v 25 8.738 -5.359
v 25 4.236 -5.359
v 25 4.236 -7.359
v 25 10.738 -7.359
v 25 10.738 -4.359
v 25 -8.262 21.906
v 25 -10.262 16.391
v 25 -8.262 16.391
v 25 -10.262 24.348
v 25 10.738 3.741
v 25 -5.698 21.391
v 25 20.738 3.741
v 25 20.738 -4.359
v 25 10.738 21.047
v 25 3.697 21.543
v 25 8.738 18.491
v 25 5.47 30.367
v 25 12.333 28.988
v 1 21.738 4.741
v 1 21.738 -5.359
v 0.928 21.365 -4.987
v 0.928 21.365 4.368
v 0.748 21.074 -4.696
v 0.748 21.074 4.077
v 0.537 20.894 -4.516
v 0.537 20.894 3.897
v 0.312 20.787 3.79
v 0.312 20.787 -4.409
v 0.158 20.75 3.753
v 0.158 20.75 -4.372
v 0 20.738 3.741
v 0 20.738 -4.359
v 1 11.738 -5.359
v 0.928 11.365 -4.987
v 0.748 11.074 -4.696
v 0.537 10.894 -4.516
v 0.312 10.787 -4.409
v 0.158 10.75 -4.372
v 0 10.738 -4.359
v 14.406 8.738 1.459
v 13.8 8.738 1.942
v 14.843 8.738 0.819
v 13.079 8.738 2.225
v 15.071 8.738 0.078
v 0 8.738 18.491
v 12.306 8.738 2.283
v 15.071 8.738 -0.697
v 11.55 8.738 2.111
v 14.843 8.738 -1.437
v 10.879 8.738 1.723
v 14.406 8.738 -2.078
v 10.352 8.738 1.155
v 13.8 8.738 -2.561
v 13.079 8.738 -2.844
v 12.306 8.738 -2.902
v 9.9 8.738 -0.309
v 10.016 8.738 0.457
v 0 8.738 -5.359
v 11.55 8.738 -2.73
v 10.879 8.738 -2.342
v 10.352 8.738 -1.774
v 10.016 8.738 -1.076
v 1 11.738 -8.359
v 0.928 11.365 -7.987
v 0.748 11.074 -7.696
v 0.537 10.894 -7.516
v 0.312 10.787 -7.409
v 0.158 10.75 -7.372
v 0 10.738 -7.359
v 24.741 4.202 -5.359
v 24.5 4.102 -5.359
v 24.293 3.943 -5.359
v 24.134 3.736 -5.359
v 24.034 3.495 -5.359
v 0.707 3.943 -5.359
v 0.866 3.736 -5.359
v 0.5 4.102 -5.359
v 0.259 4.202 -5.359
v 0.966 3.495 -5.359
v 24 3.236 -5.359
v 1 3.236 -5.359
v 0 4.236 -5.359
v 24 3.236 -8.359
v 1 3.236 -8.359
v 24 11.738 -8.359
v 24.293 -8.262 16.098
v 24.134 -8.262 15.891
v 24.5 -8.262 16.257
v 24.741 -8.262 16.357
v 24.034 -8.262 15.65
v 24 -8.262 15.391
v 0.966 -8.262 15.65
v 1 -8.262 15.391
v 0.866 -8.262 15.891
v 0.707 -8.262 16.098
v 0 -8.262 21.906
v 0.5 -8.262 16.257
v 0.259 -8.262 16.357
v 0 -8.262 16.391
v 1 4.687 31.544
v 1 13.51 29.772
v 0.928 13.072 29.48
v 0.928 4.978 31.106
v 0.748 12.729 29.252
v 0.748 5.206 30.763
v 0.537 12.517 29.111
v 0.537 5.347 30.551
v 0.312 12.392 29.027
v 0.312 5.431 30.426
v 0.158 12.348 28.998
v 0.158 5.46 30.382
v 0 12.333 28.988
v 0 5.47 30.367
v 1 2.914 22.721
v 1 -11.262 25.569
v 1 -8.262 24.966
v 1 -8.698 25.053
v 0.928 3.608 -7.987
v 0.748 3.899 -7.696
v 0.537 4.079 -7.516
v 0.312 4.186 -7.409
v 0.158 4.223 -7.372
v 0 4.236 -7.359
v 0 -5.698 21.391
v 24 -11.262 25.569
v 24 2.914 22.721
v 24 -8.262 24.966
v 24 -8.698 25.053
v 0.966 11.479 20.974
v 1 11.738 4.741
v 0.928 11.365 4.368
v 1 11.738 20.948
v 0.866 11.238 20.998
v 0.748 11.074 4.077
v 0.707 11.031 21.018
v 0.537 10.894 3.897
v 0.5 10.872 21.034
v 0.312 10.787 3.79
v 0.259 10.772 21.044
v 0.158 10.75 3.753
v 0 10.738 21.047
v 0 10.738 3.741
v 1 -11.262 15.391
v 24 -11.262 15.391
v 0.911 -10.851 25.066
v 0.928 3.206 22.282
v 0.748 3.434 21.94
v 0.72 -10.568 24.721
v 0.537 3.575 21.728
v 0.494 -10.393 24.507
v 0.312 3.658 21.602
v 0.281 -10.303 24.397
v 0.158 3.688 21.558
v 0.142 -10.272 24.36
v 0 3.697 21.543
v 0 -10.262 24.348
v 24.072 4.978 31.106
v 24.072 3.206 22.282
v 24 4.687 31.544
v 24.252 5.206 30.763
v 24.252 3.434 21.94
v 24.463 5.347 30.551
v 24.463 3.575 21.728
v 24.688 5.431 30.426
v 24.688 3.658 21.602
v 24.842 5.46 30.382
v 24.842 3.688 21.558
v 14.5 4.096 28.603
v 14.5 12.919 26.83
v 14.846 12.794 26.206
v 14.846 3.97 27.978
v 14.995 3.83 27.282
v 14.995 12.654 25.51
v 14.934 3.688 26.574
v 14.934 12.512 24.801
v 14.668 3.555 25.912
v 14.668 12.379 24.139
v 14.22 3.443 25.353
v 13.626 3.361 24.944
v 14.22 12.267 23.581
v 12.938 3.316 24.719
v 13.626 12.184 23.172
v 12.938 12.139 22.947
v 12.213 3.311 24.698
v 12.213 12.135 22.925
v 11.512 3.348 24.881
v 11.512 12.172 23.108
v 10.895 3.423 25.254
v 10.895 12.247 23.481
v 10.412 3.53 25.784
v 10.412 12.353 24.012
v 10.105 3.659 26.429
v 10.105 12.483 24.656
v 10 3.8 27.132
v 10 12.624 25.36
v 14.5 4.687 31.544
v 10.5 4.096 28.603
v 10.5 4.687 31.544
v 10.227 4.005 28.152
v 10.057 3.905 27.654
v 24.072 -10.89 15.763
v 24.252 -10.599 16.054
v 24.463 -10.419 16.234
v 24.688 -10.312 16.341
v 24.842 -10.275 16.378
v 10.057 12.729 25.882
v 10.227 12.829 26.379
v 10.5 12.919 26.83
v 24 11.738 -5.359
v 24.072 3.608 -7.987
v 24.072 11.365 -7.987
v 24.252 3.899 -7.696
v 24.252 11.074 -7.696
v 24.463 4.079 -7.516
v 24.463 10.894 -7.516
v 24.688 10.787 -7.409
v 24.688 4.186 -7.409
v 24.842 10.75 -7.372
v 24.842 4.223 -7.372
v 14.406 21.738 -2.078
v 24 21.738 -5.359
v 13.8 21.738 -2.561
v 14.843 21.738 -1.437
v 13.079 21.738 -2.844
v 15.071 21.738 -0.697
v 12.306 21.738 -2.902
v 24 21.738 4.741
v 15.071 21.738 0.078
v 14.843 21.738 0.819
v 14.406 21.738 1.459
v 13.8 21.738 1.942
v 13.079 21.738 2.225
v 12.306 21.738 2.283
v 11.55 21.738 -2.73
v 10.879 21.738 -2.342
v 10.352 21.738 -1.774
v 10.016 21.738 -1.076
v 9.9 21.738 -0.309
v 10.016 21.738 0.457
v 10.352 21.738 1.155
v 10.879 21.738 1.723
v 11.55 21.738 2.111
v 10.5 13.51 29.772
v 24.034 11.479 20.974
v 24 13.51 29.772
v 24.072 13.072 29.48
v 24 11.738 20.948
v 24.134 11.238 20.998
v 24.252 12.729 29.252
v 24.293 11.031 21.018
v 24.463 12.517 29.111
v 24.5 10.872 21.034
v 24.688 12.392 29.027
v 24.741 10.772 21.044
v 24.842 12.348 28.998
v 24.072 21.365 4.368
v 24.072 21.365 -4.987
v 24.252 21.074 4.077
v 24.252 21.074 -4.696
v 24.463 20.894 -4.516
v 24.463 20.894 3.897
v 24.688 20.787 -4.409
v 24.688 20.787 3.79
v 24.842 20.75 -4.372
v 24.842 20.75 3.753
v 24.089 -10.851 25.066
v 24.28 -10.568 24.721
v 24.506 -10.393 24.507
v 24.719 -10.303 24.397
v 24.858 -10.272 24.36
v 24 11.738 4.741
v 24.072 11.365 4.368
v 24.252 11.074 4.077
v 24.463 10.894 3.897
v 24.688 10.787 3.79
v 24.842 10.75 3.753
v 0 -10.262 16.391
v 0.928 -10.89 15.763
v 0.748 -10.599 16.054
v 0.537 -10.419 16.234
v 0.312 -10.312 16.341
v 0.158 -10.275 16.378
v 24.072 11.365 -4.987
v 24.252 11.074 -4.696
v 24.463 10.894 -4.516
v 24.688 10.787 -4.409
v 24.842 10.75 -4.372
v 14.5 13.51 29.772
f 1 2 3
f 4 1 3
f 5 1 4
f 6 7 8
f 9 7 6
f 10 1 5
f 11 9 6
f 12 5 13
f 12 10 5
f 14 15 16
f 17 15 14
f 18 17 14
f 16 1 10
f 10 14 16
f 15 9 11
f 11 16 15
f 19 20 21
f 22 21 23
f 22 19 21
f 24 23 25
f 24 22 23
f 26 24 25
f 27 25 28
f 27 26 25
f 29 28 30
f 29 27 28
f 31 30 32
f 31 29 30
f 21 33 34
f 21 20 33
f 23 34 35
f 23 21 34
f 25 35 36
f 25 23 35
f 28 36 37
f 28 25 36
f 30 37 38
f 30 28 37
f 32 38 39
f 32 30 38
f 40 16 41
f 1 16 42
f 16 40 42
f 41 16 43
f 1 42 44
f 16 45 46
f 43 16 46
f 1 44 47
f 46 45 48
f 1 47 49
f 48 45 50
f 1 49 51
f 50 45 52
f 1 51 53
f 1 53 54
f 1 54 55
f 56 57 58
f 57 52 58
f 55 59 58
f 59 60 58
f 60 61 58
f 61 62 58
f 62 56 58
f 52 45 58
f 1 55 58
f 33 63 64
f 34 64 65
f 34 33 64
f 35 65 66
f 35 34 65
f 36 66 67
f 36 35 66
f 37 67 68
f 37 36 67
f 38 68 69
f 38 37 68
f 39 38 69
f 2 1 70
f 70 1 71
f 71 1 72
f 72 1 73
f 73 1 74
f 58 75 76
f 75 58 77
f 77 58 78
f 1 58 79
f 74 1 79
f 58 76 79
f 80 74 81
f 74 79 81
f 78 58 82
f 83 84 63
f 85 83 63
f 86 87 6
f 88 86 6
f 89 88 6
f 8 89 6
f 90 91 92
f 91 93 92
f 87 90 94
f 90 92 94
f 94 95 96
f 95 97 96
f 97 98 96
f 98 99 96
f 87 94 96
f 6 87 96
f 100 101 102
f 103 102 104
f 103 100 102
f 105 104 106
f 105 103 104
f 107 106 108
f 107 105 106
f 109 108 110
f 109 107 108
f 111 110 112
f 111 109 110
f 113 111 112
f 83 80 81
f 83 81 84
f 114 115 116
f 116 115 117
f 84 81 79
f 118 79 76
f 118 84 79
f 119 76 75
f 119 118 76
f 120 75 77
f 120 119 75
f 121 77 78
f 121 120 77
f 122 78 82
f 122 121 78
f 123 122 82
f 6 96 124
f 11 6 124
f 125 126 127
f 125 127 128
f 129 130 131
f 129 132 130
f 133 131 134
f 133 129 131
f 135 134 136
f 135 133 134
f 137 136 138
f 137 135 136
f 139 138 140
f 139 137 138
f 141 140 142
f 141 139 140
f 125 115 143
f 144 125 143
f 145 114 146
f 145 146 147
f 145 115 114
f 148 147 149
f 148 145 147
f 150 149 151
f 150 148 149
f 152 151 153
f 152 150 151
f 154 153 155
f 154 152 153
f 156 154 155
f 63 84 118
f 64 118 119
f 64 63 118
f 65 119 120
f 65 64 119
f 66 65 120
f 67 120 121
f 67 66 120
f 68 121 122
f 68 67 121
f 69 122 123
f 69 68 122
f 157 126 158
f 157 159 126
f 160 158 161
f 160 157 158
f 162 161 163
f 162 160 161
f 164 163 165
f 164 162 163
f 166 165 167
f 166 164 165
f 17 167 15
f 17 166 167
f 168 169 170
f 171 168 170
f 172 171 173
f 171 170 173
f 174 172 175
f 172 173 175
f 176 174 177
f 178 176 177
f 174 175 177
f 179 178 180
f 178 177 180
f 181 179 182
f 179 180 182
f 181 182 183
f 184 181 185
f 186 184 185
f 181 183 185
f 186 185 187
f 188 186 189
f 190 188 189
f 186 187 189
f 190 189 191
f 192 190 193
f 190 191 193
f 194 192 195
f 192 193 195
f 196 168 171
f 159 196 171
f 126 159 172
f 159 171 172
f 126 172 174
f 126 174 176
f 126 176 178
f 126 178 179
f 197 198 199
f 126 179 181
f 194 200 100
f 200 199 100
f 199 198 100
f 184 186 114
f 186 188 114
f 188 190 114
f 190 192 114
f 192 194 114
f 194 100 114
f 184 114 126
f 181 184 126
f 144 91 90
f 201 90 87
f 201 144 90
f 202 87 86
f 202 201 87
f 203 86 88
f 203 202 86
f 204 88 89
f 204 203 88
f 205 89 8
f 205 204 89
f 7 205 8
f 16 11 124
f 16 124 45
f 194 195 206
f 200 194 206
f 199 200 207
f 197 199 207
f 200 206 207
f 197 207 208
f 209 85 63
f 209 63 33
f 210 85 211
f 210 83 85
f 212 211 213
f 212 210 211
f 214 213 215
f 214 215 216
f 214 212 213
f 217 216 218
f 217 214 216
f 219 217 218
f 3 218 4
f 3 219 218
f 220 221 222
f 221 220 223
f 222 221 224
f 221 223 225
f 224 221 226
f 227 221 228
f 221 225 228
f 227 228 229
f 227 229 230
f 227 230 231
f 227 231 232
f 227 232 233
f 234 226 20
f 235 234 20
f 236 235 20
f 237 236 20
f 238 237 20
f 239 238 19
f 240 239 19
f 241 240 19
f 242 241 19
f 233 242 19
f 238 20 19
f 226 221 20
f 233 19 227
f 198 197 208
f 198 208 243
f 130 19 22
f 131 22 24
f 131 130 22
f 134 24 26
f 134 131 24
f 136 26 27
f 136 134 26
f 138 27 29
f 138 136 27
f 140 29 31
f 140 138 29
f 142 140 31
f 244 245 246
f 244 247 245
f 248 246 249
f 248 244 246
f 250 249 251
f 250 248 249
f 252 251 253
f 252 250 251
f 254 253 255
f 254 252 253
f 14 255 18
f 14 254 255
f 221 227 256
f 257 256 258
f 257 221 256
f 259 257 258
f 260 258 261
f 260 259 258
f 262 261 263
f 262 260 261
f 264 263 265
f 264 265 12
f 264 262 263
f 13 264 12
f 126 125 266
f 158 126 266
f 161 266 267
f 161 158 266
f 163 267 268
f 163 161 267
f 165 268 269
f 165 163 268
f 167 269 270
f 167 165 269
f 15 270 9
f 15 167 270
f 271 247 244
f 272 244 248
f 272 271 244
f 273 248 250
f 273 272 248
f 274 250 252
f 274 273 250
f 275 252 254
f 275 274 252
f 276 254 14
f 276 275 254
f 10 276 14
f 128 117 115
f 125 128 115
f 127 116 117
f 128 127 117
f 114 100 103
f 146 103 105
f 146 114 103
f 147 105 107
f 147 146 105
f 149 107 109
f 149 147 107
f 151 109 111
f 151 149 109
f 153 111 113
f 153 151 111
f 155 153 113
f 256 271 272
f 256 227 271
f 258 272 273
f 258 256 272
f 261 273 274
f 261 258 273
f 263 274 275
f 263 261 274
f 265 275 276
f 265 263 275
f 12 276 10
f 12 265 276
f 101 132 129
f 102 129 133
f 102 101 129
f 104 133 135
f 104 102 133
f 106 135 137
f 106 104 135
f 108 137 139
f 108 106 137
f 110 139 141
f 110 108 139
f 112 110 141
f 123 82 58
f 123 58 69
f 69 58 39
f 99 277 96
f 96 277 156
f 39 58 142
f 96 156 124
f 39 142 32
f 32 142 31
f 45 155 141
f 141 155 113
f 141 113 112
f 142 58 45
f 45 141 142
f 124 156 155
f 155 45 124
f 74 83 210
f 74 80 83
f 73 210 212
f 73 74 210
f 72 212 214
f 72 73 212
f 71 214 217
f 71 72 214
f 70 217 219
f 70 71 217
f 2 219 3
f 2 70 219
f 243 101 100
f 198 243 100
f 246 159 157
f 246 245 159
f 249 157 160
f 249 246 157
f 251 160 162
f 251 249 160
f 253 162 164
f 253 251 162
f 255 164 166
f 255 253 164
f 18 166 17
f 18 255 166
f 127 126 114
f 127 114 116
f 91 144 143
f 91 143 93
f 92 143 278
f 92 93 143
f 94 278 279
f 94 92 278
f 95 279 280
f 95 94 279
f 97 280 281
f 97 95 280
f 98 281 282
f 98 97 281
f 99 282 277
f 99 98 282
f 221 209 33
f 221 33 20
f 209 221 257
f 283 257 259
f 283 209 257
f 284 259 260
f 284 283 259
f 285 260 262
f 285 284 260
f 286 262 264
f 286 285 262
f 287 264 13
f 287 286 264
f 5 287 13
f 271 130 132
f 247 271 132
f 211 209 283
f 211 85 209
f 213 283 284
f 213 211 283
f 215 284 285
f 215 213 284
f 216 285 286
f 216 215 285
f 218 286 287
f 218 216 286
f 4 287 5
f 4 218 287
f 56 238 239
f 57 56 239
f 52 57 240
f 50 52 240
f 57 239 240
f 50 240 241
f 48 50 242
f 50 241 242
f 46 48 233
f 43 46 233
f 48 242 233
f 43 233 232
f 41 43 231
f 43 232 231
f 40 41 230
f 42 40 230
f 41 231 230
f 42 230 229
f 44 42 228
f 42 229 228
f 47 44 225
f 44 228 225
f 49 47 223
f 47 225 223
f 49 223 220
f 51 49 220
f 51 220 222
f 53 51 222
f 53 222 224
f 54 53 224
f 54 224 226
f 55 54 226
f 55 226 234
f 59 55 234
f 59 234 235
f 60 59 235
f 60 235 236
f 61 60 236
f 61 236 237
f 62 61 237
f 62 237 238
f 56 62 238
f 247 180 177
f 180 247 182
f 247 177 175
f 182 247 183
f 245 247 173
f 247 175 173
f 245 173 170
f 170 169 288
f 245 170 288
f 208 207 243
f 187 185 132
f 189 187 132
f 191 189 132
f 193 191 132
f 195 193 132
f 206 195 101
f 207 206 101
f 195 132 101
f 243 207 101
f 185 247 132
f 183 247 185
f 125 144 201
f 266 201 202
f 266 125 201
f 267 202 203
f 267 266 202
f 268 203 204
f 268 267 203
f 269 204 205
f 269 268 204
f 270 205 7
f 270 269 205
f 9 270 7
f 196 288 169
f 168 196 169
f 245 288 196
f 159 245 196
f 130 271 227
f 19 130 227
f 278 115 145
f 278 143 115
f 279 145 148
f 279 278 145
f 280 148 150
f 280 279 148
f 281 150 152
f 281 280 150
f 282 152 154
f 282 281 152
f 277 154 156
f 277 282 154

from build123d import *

# Parameters (mm, degrees)
F0_W      = 10
F0_H      = 10.1
F1_DEPTH  = 25
F3_DEPTH  = 24.6375403377
F4_R      = 2.6
F5_DEPTH  = 33.001
F7_DEPTH  = 1
F9_DEPTH  = 1
F11_DEPTH = 1
F12_R     = 0.99999
F13_R     = 0.99999


# Not quite as in the source:
# - a fillet or chamfer is up to 0.001 mm smaller than in the source, because OpenCascade refuses the exact size


with BuildPart() as f1:
    # F0 (on Right) → F1 (new body)
    with BuildSketch(Plane.YZ):
        Polygon((8.7376843859, -5.3593200147), (3.235891927, -5.3593200147), (3.235891927, -8.3593200147), (8.7376843859, -8.3593200147), (11.7376843859, -8.3593200147), (11.7376843859, -5.3593200147), (11.7376843859, 4.7406799853), (11.7376843859, 20.9479271312), (2.9139854062, 22.7205907531), (-8.2623156141, 24.9658874581), (-8.2623156141, 21.9059462631), (-5.6975004546, 21.3906799853), (8.7376843859, 18.4906799853), align=None)
        Polygon((-8.2623156141, 15.3906799853), (-8.2623156141, 21.9059462631), (-8.2623156141, 24.9658874581), (-8.6975004546, 25.0533152293), (-11.2623156141, 25.5685815071), (-11.2623156141, 15.3906799853), (-8.6975004546, 15.3906799853), align=None)
        with Locations((16.7376843859, -0.3093200147)):
            Rectangle(F0_W, F0_H)
        Polygon((4.6866490281, 31.5442897327), (2.9139854062, 22.7205907531), (11.7376843859, 20.9479271312), (13.5103480077, 29.7716261109), align=None)
    extrude(amount=F1_DEPTH)

    # F2 (on face) → F3 (cut, through all)
    with BuildSketch(Plane(origin=(0, 7.2371941298, -1.4539379446), x_dir=(-1, 0, 0), z_dir=(0, 0.9804109977, -0.1969626246))):
        with BuildLine():
            ThreePointArc((-14.5, 28.8494632633), (-13.290569415, 24.9777550181), (-10, 27.3494632633))
            ThreePointArc((-10, 27.3494632633), (-10.1282917549, 28.1400326783), (-10.5, 28.8494632633))
            ThreePointArc((-10.5, 28.8494632633), (-12.5, 29.8494632633), (-14.5, 28.8494632633))
        make_face()
        with BuildLine():
            ThreePointArc((-14.5, 28.8494632633), (-12.5, 29.8494632633), (-10.5, 28.8494632633))
            Line((-10.5, 28.8494632633), (-10.5, 31.8494632633))
            Line((-10.5, 31.8494632633), (-12.5, 31.8494632633))
            Line((-12.5, 31.8494632633), (-14.5, 31.8494632633))
            Line((-14.5, 31.8494632633), (-14.5, 28.8494632633))
        make_face()
    extrude(amount=-F3_DEPTH, mode=Mode.SUBTRACT)

    # F4 (on face) → F5 (cut, through all)
    with BuildSketch(Plane(origin=(0, 21.7376843859, 0), x_dir=(-1, 0, 0), z_dir=(0, 1, 0))):
        with Locations((-12.5, -0.3093200147)):
            Circle(F4_R)
    extrude(amount=-F5_DEPTH, mode=Mode.SUBTRACT)

    # F6 (on face) → F7 (cut)
    with BuildSketch(Plane(origin=(0, 0, 0), x_dir=(0, -1, 0), z_dir=(-1, 0, 0))):
        Polygon((0.6576159399, 20.3781771837), (8.2623156141, 15.3906799853), (8.2623156141, 21.9059462631), align=None)
    extrude(amount=-F7_DEPTH, mode=Mode.SUBTRACT)

    # F8 (on face) → F9 (cut)
    with BuildSketch(Plane.YZ.offset(25)):
        Polygon((-11.2623156141, 15.3906799853), (-8.2623156141, 15.3906799853), (-8.2623156141, 16.3906799853), (-10.2623156141, 16.3906799853), (-10.2623156141, 24.3477030924), (3.6974337793, 21.5432171307), (5.4700974012, 30.3669161103), (12.3329743853, 28.9881777378), (10.7376843859, 21.0473825599), (10.7376843859, 3.7406799853), (20.7376843859, 3.7406799853), (20.7376843859, -4.3593200147), (10.7376843859, -4.3593200147), (10.7376843859, -7.3593200147), (4.235891927, -7.3593200147), (4.235891927, -5.3593200147), (3.235891927, -5.3593200147), (3.235891927, -8.3593200147), (11.7376843859, -8.3593200147), (11.7376843859, -5.3593200147), (21.7376843859, -5.3593200147), (21.7376843859, 4.7406799853), (11.7376843859, 4.7406799853), (11.7376843859, 20.9479271312), (13.5103480077, 29.7716261109), (4.6866490281, 31.5442897327), (2.9139854062, 22.7205907531), (-11.2623156141, 25.5685815071), align=None)
    extrude(amount=-F9_DEPTH, mode=Mode.SUBTRACT)

    # F10 (on face) → F11 (cut)
    with BuildSketch(Plane(origin=(0, 0, 0), x_dir=(0, -1, 0), z_dir=(-1, 0, 0))):
        Polygon((8.2623156141, 16.3906799853), (8.2623156141, 15.3906799853), (11.2623156141, 15.3906799853), (11.2623156141, 25.5685815071), (-2.9139854062, 22.7205907531), (-4.6866490281, 31.5442897327), (-13.5103480077, 29.7716261109), (-11.7376843859, 20.9479271312), (-11.7376843859, 4.7406799853), (-21.7376843859, 4.7406799853), (-21.7376843859, -5.3593200147), (-11.7376843859, -5.3593200147), (-11.7376843859, -8.3593200147), (-3.235891927, -8.3593200147), (-3.235891927, -5.3593200147), (-4.235891927, -5.3593200147), (-4.235891927, -7.3593200147), (-10.7376843859, -7.3593200147), (-10.7376843859, -4.3593200147), (-20.7376843859, -4.3593200147), (-20.7376843859, 3.7406799853), (-10.7376843859, 3.7406799853), (-10.7376843859, 21.0473825599), (-12.3329743853, 28.9881777378), (-5.4700974012, 30.3669161103), (-3.6974337793, 21.5432171307), (10.2623156141, 24.3477030924), (10.2623156141, 16.3906799853), align=None)
    extrude(amount=-F11_DEPTH, mode=Mode.SUBTRACT)

    # F12 (radius 1 in the source; OpenCascade refuses exactly that, so slightly less here)
    f12_edges = [f1.edges().sort_by_distance(p)[0] for p in [
        (24, 4.235892, -6.35932),
        (24, 7.486788, -7.35932),
        (24, 15.737684, -4.35932),
        (24, 10.737684, -5.85932),
        (24, 20.737684, -0.30932),
        (24, 10.737684, 12.394031),
        (24, 15.737684, 3.74068),
        (24, 11.535329, 25.01778),
        (24, 8.901536, 29.677547),
        (24, -3.282441, 22.94546),
        (24, 4.583766, 25.955067),
        (24, -10.262316, 20.369192),
        (24, -9.262316, 16.39068),
    ]]
    fillet(f12_edges, radius=F12_R)

    # F13 (radius 1 in the source; OpenCascade refuses exactly that, so slightly less here)
    f13_edges = [f1.edges().sort_by_distance(p)[0] for p in [
        (1, 4.235892, -6.35932),
        (1, 7.486788, -7.35932),
        (1, 15.737684, -4.35932),
        (1, 10.737684, -5.85932),
        (1, 20.737684, -0.30932),
        (1, 10.737684, 12.394031),
        (1, 15.737684, 3.74068),
        (1, 11.535329, 25.01778),
        (1, 8.901536, 29.677547),
        (1, -3.282441, 22.94546),
        (1, 4.583766, 25.955067),
        (1, -10.262316, 20.369192),
        (1, -9.262316, 16.39068),
    ]]
    fillet(f13_edges, radius=F13_R)


solid = f1.part
